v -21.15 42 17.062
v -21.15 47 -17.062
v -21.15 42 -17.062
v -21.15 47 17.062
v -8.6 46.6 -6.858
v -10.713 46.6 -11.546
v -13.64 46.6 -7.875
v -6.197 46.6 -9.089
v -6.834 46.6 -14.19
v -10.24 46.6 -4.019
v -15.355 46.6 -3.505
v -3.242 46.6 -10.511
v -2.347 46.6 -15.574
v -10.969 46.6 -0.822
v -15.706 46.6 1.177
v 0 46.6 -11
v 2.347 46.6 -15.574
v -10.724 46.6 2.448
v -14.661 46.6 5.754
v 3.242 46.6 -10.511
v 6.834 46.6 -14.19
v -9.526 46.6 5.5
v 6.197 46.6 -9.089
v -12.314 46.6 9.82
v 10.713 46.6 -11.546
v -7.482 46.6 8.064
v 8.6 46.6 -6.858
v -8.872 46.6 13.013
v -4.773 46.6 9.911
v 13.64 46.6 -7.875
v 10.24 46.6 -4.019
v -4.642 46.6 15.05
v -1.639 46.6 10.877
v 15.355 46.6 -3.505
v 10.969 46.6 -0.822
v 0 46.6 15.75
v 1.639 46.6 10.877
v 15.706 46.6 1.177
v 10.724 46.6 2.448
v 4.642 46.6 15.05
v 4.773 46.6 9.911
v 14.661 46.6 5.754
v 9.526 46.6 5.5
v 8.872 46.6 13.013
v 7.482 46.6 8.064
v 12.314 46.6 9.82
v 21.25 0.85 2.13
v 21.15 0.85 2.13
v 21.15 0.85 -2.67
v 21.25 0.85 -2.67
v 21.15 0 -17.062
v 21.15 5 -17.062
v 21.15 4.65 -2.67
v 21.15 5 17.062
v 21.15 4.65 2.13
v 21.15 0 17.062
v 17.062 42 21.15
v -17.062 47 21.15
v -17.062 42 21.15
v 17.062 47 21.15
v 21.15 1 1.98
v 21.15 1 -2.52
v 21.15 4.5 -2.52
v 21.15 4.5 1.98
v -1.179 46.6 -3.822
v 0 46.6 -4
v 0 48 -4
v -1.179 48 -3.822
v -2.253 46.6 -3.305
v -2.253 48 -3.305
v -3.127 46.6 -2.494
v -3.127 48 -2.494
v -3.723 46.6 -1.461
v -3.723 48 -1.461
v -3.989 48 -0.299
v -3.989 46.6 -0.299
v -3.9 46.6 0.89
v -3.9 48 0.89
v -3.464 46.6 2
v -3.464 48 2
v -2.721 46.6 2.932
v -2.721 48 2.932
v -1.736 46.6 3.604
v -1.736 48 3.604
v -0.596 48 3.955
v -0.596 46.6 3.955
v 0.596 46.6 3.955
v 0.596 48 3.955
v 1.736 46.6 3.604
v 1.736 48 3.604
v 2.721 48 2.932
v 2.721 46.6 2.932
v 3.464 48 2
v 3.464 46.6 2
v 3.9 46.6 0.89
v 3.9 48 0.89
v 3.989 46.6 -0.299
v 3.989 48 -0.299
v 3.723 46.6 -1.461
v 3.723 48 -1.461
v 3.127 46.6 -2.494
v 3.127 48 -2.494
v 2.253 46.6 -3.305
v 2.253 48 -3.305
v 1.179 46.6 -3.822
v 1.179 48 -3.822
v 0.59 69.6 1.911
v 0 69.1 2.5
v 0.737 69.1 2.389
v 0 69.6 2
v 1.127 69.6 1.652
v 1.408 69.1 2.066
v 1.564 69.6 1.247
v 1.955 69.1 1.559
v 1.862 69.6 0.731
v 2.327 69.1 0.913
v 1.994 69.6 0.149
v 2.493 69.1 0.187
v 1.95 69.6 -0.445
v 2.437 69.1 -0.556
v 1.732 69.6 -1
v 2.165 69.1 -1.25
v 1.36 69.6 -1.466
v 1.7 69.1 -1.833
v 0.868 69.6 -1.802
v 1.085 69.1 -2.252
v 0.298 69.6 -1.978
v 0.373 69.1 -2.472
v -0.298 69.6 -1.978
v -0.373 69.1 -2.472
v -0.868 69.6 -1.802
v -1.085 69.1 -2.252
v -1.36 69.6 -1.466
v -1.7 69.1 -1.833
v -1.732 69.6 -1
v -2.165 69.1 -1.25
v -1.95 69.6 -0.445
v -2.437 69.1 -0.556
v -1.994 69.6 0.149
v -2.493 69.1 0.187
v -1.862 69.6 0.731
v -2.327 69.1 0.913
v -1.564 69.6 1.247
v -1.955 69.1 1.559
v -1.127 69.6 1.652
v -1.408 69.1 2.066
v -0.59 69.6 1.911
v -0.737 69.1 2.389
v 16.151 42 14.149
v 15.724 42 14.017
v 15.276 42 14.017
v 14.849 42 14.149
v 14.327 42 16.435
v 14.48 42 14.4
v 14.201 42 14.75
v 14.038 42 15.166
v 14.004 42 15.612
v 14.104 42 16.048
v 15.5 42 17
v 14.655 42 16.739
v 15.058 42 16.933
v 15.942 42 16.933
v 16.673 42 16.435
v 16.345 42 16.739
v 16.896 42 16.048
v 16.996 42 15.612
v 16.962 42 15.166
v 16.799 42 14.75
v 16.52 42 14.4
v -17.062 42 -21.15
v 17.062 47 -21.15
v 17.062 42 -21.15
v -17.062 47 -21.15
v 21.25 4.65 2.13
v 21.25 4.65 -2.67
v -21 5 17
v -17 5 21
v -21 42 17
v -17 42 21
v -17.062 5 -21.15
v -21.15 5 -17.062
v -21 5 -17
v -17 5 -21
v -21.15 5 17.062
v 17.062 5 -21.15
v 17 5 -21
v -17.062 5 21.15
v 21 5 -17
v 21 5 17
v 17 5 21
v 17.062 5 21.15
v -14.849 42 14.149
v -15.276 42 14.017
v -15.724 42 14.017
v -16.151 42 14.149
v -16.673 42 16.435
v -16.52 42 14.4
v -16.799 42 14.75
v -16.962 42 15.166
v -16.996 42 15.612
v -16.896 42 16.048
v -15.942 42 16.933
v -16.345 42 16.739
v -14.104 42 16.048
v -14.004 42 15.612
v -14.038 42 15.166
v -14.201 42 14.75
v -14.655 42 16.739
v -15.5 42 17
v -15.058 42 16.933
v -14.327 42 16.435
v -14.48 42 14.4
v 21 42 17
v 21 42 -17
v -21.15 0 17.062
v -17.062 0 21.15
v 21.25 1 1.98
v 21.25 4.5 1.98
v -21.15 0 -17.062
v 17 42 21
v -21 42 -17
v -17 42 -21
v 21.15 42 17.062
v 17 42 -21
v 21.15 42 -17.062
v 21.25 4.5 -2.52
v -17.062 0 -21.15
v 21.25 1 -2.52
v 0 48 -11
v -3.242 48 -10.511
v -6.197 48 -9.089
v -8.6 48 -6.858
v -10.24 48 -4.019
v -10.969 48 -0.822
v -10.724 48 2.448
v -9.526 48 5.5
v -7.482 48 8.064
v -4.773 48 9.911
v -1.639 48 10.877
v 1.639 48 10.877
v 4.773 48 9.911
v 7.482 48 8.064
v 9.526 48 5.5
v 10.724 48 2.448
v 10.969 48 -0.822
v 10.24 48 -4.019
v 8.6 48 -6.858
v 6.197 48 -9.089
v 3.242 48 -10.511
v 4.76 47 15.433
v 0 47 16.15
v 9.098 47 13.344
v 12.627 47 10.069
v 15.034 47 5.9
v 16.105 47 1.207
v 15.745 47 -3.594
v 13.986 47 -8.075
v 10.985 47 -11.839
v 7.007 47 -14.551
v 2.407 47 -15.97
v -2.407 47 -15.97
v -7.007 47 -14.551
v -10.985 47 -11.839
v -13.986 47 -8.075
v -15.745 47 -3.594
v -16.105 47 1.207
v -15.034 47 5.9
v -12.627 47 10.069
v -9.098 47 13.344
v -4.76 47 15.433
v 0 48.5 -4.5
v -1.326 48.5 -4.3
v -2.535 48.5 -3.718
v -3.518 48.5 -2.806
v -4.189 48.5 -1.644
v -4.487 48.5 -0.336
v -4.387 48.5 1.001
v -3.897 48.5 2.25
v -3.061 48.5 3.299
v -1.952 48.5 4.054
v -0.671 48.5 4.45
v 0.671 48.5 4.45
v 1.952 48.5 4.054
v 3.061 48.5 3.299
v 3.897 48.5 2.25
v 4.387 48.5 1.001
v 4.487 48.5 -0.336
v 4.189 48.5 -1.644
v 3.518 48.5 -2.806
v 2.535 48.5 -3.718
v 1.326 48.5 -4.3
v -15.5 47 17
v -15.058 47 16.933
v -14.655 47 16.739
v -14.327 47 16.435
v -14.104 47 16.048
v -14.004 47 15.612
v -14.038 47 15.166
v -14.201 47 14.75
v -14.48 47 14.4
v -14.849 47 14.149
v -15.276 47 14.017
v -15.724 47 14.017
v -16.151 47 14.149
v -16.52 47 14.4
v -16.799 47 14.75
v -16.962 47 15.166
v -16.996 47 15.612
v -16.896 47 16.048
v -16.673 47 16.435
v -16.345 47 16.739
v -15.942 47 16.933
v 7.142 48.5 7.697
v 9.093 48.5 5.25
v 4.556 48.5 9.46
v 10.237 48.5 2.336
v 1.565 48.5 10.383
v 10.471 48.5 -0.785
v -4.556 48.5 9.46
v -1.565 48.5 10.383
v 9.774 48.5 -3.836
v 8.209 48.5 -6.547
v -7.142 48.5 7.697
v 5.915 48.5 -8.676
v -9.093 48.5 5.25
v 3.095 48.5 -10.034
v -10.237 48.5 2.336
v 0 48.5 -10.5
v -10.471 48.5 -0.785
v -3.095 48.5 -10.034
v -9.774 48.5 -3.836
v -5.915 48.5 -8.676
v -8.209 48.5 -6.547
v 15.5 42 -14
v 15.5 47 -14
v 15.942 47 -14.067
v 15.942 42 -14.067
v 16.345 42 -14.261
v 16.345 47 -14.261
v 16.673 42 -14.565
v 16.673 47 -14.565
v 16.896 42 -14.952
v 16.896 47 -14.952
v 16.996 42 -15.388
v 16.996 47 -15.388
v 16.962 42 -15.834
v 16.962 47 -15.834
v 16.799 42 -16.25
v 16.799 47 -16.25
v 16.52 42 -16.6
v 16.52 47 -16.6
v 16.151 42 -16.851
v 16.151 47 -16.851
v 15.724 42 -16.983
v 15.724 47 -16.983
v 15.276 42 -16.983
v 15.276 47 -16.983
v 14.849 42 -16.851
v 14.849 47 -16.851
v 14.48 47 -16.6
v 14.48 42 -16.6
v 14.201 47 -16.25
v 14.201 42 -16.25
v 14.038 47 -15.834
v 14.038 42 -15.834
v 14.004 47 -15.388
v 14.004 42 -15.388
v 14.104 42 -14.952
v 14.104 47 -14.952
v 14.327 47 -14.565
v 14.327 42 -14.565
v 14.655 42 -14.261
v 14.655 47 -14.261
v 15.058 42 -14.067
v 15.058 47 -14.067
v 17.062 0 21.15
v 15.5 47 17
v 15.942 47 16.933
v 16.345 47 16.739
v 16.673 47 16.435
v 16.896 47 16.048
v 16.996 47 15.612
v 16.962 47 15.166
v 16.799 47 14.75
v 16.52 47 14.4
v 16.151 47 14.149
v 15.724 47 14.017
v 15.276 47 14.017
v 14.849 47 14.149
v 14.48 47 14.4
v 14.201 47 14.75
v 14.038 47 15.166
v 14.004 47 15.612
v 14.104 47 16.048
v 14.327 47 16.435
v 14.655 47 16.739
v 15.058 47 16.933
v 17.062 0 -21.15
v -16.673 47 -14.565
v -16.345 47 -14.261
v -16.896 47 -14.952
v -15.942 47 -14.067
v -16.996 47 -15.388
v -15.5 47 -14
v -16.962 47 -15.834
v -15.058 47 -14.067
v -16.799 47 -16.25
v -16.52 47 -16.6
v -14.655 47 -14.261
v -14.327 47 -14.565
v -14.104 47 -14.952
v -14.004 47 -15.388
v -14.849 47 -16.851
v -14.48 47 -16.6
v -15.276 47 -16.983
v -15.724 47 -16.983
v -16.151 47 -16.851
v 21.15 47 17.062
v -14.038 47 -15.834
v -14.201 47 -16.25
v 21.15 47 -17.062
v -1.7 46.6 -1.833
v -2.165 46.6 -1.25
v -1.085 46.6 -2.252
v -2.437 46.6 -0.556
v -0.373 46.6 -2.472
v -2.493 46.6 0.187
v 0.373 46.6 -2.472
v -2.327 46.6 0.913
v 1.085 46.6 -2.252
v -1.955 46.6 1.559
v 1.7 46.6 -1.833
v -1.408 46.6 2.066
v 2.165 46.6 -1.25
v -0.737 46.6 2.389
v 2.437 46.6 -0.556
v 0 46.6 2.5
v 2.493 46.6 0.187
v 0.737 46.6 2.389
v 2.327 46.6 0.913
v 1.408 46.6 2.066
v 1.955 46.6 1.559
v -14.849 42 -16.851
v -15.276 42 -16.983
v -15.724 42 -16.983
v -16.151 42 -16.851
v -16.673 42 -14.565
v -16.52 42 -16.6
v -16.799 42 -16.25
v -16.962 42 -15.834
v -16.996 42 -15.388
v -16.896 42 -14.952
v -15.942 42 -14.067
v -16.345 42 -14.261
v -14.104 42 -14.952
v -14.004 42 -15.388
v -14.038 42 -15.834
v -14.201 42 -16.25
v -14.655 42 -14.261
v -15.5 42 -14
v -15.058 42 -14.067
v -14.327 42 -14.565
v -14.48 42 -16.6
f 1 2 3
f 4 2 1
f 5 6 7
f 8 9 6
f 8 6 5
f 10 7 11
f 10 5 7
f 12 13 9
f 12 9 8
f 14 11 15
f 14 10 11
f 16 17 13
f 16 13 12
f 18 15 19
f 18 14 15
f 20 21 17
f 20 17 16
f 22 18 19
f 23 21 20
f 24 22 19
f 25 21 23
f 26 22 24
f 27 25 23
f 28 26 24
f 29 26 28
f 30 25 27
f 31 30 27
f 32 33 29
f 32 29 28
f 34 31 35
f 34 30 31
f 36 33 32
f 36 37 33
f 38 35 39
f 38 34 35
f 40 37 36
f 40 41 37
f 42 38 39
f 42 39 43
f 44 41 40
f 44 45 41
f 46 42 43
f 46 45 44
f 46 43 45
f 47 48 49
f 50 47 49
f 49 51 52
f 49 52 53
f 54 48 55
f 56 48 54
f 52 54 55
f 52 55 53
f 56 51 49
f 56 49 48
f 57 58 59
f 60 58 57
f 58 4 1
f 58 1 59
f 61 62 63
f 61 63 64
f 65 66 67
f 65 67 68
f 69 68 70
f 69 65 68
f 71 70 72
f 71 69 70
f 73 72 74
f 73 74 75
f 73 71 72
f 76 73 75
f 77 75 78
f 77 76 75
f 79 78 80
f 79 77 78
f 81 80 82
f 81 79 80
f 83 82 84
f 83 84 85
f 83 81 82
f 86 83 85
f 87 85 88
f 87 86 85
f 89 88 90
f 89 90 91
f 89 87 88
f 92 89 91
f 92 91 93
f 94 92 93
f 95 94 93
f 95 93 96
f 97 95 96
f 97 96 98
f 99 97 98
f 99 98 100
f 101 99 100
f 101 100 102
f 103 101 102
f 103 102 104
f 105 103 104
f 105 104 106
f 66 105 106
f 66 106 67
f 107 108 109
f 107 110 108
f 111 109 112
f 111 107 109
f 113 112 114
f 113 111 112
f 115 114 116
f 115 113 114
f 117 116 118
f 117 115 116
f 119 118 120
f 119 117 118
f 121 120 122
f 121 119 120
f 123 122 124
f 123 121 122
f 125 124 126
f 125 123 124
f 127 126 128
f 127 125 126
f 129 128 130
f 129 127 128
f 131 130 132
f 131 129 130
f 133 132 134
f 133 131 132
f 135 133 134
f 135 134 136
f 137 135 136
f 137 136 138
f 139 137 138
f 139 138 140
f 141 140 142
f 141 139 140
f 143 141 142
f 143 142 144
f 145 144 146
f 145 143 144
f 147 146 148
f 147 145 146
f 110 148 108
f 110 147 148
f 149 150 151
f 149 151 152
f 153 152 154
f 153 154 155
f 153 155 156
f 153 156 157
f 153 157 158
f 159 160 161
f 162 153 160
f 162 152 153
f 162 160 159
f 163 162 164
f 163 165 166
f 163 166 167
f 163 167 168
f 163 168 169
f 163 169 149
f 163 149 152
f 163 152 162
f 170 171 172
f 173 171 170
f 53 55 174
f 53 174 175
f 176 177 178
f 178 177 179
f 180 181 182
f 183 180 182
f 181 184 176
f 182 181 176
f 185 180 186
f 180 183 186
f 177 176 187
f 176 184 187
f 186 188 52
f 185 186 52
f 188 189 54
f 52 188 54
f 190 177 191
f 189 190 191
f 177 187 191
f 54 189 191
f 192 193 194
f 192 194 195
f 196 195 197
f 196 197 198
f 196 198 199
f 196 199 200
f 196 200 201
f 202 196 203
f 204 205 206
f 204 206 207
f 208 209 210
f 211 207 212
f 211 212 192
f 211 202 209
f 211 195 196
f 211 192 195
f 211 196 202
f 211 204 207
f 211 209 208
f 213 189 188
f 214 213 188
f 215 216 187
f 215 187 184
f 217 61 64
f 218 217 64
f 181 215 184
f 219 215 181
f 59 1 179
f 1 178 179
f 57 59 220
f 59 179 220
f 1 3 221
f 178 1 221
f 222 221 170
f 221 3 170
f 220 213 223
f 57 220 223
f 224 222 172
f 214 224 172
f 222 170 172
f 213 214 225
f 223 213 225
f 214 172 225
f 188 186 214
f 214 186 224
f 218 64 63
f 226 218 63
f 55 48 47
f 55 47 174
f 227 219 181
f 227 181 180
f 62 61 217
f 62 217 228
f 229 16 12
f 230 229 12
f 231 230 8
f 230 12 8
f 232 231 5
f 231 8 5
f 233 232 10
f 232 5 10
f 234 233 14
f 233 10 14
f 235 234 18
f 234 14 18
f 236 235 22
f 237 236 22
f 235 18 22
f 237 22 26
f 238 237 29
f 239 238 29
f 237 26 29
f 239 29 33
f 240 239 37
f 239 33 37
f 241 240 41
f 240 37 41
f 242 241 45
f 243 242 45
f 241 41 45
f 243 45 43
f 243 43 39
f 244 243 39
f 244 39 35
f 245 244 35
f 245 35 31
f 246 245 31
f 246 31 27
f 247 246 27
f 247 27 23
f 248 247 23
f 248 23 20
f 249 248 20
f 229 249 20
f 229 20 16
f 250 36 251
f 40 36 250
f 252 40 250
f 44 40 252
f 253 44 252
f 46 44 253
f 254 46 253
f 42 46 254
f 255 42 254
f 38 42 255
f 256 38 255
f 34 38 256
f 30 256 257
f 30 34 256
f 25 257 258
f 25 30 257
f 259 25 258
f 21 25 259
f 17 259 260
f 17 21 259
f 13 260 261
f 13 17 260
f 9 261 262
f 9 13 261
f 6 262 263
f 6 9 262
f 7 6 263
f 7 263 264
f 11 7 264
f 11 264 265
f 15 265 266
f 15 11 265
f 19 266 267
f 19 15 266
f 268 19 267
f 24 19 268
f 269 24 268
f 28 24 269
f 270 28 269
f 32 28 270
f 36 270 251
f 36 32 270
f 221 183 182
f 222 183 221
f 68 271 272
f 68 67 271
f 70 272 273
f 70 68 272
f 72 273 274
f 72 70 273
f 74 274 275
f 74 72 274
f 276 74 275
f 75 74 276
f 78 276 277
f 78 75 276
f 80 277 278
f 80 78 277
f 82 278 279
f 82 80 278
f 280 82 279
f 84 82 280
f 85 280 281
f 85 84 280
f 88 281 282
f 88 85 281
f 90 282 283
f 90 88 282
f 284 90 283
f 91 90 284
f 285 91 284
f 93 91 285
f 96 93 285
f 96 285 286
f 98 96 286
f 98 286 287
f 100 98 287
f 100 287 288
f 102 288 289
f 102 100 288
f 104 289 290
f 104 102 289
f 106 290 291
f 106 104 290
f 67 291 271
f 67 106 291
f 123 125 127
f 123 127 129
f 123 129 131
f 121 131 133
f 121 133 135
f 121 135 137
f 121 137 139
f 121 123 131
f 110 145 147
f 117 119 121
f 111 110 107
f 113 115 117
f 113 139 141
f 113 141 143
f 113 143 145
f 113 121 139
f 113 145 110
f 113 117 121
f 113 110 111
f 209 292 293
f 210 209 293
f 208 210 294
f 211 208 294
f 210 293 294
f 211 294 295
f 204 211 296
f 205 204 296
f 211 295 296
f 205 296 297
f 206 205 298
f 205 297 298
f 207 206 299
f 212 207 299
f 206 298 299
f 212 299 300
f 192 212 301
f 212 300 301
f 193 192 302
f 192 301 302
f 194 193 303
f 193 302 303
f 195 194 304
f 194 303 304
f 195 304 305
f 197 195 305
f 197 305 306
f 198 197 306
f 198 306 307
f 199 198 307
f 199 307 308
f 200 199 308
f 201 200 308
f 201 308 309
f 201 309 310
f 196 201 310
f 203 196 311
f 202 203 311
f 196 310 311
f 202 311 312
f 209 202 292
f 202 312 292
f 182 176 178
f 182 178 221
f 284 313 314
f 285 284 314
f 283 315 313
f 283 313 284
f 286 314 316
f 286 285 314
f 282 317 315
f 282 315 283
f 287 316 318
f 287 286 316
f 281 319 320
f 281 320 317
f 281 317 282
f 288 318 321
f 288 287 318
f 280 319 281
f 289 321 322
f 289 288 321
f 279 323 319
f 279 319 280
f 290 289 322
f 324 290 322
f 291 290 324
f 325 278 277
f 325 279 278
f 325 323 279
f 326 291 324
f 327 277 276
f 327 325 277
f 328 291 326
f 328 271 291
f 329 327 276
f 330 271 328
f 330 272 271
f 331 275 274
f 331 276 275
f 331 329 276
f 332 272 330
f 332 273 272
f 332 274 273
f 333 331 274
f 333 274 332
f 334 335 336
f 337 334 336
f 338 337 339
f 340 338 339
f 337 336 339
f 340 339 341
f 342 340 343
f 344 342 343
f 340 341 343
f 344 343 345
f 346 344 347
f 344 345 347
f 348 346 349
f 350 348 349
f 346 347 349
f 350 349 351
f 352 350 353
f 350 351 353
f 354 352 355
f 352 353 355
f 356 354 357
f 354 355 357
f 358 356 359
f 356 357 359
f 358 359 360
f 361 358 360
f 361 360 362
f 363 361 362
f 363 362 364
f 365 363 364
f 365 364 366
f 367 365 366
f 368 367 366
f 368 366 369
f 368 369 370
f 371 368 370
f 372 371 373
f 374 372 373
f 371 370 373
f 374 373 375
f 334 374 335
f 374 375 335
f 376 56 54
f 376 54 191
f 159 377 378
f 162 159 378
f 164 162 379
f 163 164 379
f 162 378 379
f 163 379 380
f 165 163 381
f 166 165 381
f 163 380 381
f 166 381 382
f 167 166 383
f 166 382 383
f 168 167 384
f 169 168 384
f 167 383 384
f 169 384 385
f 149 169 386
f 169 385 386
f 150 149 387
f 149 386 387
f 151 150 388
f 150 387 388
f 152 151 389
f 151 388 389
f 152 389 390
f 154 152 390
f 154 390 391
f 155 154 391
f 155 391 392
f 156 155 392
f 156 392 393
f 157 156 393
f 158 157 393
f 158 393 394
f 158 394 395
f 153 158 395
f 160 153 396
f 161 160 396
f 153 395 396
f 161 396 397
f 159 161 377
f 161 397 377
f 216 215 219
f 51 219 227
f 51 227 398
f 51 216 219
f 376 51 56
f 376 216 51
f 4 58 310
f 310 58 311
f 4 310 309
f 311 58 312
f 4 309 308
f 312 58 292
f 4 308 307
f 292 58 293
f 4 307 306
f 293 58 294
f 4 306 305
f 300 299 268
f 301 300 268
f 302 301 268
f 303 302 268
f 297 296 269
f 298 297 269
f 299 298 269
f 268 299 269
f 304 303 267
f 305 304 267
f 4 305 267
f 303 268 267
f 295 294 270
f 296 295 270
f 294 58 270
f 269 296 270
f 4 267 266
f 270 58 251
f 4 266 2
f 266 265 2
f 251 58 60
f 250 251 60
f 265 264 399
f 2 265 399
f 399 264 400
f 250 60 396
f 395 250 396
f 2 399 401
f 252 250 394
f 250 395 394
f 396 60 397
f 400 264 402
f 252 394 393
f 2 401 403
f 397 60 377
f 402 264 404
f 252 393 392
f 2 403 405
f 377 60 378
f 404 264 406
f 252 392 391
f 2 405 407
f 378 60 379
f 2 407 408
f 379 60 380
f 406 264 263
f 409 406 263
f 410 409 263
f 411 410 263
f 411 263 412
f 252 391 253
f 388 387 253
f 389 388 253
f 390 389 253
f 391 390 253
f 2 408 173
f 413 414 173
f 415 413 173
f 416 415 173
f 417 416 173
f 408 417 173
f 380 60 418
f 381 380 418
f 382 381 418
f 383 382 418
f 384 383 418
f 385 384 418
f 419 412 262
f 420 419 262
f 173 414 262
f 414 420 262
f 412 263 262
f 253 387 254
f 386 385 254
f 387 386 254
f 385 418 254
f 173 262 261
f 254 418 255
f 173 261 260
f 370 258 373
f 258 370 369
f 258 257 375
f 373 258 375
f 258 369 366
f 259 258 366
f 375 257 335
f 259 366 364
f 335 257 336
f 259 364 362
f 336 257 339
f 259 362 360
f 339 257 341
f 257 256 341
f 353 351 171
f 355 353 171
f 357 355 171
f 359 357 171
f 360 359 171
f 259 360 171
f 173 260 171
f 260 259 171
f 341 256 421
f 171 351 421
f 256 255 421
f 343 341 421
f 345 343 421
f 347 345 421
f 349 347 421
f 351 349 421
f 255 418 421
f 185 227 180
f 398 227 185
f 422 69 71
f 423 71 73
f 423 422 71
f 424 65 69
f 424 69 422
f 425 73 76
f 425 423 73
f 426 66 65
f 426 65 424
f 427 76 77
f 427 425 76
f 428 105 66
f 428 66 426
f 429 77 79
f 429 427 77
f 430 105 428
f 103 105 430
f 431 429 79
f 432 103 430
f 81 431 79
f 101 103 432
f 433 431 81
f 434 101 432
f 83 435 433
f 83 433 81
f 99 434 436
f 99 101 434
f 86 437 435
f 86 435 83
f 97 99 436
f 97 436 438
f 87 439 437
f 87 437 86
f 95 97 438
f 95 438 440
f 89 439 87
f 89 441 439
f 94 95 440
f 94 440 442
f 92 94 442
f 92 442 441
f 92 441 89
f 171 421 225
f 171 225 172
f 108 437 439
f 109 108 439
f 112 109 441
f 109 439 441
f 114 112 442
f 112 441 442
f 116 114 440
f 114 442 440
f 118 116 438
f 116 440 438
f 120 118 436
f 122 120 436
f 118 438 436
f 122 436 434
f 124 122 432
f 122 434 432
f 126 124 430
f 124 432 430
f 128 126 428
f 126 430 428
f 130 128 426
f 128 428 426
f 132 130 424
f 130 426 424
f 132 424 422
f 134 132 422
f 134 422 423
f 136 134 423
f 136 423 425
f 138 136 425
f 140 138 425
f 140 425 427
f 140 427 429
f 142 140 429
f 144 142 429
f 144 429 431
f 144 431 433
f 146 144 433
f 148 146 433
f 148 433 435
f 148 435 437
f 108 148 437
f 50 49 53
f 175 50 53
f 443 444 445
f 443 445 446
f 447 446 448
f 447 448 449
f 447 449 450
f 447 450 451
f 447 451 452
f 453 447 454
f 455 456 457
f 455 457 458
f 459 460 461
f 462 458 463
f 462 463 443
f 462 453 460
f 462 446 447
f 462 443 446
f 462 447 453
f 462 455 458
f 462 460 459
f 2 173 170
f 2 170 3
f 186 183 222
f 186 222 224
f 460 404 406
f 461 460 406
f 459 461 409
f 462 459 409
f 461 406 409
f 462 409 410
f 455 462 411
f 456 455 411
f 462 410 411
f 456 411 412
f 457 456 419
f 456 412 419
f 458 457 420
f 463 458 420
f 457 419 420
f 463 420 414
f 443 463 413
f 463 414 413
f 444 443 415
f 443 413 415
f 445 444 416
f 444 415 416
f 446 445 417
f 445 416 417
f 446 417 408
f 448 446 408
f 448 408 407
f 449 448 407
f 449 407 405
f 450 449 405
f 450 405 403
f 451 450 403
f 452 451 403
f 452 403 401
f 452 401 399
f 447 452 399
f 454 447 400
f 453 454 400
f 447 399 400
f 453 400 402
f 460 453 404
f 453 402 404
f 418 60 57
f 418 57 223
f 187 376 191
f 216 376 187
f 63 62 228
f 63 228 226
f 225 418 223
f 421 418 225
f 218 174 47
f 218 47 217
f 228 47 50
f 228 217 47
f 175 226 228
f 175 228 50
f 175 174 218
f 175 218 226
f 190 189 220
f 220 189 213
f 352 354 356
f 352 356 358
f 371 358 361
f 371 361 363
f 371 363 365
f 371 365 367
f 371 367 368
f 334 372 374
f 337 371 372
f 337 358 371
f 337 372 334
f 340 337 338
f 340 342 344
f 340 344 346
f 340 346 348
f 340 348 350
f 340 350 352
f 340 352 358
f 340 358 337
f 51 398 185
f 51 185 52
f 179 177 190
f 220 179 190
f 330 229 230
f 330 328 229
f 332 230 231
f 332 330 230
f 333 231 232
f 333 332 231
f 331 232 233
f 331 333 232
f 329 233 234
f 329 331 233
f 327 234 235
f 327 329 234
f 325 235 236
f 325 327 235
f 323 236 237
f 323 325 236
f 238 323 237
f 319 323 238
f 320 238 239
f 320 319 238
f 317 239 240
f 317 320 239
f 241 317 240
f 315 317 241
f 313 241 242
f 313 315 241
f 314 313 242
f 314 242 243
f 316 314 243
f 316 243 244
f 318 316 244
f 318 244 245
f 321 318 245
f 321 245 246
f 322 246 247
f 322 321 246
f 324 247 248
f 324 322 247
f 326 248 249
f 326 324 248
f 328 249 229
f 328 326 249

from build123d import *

# Parameters (mm, degrees)
SKETCH1_W           = 42
SKETCH1_H           = 42
BOSS_EXTRUDE1_DEPTH = 47
CHAMFER1_SIZE       = 4
BOSS_EXTRUDE4_DEPTH = 5
BOSS_EXTRUDE5_DEPTH = 5
SKETCH2_R           = 16.25
CUT_EXTRUDE1_DEPTH  = 0.4
SKETCH3_R           = 11
SKETCH3_R_2         = 4
BOSS_EXTRUDE2_DEPTH = 1.9
SKETCH4_R           = 2.5
BOSS_EXTRUDE3_DEPTH = 23
CHAMFER2_SIZE       = 0.5
SKETCH5_R           = 1.5
CUT_EXTRUDE2_DEPTH  = 5
SKETCH8_W           = 4.8
SKETCH8_H           = 3.8
SKETCH8_W_2         = 4.5
SKETCH8_H_2         = 3.5
BOSS_EXTRUDE6_DEPTH = 0.1


with BuildPart() as part:
    # Sketch1 → Boss-Extrude1 (new body)
    with BuildSketch(Plane(origin=(0, 0, 0), x_dir=(1, 0, 0), z_dir=(0, 1, 0))):
        Rectangle(SKETCH1_W, SKETCH1_H)
    extrude(amount=BOSS_EXTRUDE1_DEPTH)

    # Chamfer1
    chamfer1_edges = [part.edges().sort_by_distance(p)[0] for p in [
        (21, 23.5, 21),
        (-21, 23.5, 21),
        (-21, 23.5, -21),
        (21, 23.5, -21),
    ]]
    chamfer(chamfer1_edges, length=CHAMFER1_SIZE)

    # Sketch6 → Boss-Extrude4 (add)
    with BuildSketch(Plane(origin=(0, 47, 0), x_dir=(1, 0, 0), z_dir=(0, 1, 0))):
        Polygon((17.062132034, 21.15), (-17.062132034, 21.15), (-21.15, 17.062132034), (-21.15, -17.062132034), (-17.062132034, -21.15), (17.062132034, -21.15), (21.15, -17.062132034), (21.15, 17.062132034), align=None)
    extrude(amount=-BOSS_EXTRUDE4_DEPTH)

    # Sketch7 → Boss-Extrude5 (add)
    with BuildSketch(Plane.XZ):
        Polygon((-21.15, 17.062132034), (-21.15, -17.062132034), (-17.062132034, -21.15), (17.062132034, -21.15), (21.15, -17.062132034), (21.15, 17.062132034), (17.062132034, 21.15), (-17.062132034, 21.15), align=None)
    extrude(amount=-BOSS_EXTRUDE5_DEPTH)

    # Sketch2 → Cut-Extrude1 (cut)
    with BuildSketch(Plane(origin=(0, 47, 0), x_dir=(1, 0, 0), z_dir=(0, 1, 0))):
        with Locations(Location((0, 0, 0), (0, 0, 270))):
            Circle(SKETCH2_R)
    extrude(amount=-CUT_EXTRUDE1_DEPTH, mode=Mode.SUBTRACT)

    # Sketch3 → Boss-Extrude2 (add)
    with BuildSketch(Plane(origin=(0, 46.6, 0), x_dir=(1, 0, 0), z_dir=(0, 1, 0))):
        with Locations(Location((0, 0, 0), (0, 0, 90))):
            Circle(SKETCH3_R)
        with Locations(Location((0, 0, 0), (0, 0, 90))):
            Circle(SKETCH3_R_2, mode=Mode.SUBTRACT)
    extrude(amount=BOSS_EXTRUDE2_DEPTH)

    # Sketch4 → Boss-Extrude3 (add)
    with BuildSketch(Plane(origin=(0, 46.6, 0), x_dir=(1, 0, 0), z_dir=(0, 1, 0))):
        with Locations(Location((0, 0, 0), (0, 0, 270))):
            Circle(SKETCH4_R)
    extrude(amount=BOSS_EXTRUDE3_DEPTH)

    # Chamfer2
    # the kernel refuses this chamfer: 0.5 mm, written as the material it adds along each edge
    with BuildSketch(Plane(origin=(0, 46.6, 0), x_dir=(0, 0, 1), z_dir=(-1, 0, 0))) as chamfer2_piece_1_section:
        Polygon((16.25, CHAMFER2_SIZE), (16.25 - CHAMFER2_SIZE, 0), (16.25, 0), align=None)
    chamfer2_piece_1 = revolve(axis=Axis((0, 46.6, 0), (0, 1, 0)), mode=Mode.PRIVATE)
    chamfer2_piece_1 = split(chamfer2_piece_1, bisect_by=Plane(origin=(0, 47, -15.959627936), z_dir=(0, -1, 0)), keep=Keep.TOP, mode=Mode.PRIVATE)
    add(chamfer2_piece_1)
    # the kernel refuses this chamfer: 0.5 mm, written as the material it takes off along each edge
    with BuildSketch(Plane(origin=(0, 48.5, 0), x_dir=(0, 0, -1), z_dir=(1, 0, 0))) as chamfer2_2_piece_1:
        Polygon((4 + CHAMFER2_SIZE, 0), (4, -CHAMFER2_SIZE), (4, 0), align=None)
    revolve(axis=Axis((0, 48.5, 0), (0, 1, 0)), mode=Mode.SUBTRACT)
    with BuildSketch(Plane(origin=(0, 48.5, 0), x_dir=(0, 0, -1), z_dir=(1, 0, 0))) as chamfer2_2_piece_2:
        Polygon((11, -CHAMFER2_SIZE), (11 - CHAMFER2_SIZE, 0), (11, 0), align=None)
    revolve(axis=Axis((0, 48.5, 0), (0, 1, 0)), mode=Mode.SUBTRACT)
    with BuildSketch(Plane(origin=(0, 69.6, 0), x_dir=(0, 0, 1), z_dir=(-1, 0, 0))) as chamfer2_2_piece_3:
        Polygon((2.5, -CHAMFER2_SIZE), (2.5 - CHAMFER2_SIZE, 0), (2.5, 0), align=None)
    revolve(axis=Axis((0, 69.6, 0), (0, 1, 0)), mode=Mode.SUBTRACT)

    # Sketch5 → Cut-Extrude2 (cut)
    with BuildSketch(Plane(origin=(0, 47, 0), x_dir=(1, 0, 0), z_dir=(0, 1, 0))):
        with Locations(Location((-15.5, 15.5, 0), (0, 0, 270))):
            Circle(SKETCH5_R)
        with Locations(Location((15.5, 15.5, 0), (0, 0, 270))):
            Circle(SKETCH5_R)
        with Locations(Location((15.5, -15.5, 0), (0, 0, 270))):
            Circle(SKETCH5_R)
        with Locations(Location((-15.5, -15.5, 0), (0, 0, 270))):
            Circle(SKETCH5_R)
    extrude(amount=-CUT_EXTRUDE2_DEPTH, mode=Mode.SUBTRACT)

    # Sketch8 → Boss-Extrude6 (add)
    with BuildSketch(Plane(origin=(21.15, 0, 0), x_dir=(0, 0, -1), z_dir=(1, 0, 0))):
        with Locations((0.269797982, 2.75)):
            Rectangle(SKETCH8_W, SKETCH8_H)
        with Locations((0.269797982, 2.75)):
            Rectangle(SKETCH8_W_2, SKETCH8_H_2, mode=Mode.SUBTRACT)
    extrude(amount=BOSS_EXTRUDE6_DEPTH)


solid = part.part
